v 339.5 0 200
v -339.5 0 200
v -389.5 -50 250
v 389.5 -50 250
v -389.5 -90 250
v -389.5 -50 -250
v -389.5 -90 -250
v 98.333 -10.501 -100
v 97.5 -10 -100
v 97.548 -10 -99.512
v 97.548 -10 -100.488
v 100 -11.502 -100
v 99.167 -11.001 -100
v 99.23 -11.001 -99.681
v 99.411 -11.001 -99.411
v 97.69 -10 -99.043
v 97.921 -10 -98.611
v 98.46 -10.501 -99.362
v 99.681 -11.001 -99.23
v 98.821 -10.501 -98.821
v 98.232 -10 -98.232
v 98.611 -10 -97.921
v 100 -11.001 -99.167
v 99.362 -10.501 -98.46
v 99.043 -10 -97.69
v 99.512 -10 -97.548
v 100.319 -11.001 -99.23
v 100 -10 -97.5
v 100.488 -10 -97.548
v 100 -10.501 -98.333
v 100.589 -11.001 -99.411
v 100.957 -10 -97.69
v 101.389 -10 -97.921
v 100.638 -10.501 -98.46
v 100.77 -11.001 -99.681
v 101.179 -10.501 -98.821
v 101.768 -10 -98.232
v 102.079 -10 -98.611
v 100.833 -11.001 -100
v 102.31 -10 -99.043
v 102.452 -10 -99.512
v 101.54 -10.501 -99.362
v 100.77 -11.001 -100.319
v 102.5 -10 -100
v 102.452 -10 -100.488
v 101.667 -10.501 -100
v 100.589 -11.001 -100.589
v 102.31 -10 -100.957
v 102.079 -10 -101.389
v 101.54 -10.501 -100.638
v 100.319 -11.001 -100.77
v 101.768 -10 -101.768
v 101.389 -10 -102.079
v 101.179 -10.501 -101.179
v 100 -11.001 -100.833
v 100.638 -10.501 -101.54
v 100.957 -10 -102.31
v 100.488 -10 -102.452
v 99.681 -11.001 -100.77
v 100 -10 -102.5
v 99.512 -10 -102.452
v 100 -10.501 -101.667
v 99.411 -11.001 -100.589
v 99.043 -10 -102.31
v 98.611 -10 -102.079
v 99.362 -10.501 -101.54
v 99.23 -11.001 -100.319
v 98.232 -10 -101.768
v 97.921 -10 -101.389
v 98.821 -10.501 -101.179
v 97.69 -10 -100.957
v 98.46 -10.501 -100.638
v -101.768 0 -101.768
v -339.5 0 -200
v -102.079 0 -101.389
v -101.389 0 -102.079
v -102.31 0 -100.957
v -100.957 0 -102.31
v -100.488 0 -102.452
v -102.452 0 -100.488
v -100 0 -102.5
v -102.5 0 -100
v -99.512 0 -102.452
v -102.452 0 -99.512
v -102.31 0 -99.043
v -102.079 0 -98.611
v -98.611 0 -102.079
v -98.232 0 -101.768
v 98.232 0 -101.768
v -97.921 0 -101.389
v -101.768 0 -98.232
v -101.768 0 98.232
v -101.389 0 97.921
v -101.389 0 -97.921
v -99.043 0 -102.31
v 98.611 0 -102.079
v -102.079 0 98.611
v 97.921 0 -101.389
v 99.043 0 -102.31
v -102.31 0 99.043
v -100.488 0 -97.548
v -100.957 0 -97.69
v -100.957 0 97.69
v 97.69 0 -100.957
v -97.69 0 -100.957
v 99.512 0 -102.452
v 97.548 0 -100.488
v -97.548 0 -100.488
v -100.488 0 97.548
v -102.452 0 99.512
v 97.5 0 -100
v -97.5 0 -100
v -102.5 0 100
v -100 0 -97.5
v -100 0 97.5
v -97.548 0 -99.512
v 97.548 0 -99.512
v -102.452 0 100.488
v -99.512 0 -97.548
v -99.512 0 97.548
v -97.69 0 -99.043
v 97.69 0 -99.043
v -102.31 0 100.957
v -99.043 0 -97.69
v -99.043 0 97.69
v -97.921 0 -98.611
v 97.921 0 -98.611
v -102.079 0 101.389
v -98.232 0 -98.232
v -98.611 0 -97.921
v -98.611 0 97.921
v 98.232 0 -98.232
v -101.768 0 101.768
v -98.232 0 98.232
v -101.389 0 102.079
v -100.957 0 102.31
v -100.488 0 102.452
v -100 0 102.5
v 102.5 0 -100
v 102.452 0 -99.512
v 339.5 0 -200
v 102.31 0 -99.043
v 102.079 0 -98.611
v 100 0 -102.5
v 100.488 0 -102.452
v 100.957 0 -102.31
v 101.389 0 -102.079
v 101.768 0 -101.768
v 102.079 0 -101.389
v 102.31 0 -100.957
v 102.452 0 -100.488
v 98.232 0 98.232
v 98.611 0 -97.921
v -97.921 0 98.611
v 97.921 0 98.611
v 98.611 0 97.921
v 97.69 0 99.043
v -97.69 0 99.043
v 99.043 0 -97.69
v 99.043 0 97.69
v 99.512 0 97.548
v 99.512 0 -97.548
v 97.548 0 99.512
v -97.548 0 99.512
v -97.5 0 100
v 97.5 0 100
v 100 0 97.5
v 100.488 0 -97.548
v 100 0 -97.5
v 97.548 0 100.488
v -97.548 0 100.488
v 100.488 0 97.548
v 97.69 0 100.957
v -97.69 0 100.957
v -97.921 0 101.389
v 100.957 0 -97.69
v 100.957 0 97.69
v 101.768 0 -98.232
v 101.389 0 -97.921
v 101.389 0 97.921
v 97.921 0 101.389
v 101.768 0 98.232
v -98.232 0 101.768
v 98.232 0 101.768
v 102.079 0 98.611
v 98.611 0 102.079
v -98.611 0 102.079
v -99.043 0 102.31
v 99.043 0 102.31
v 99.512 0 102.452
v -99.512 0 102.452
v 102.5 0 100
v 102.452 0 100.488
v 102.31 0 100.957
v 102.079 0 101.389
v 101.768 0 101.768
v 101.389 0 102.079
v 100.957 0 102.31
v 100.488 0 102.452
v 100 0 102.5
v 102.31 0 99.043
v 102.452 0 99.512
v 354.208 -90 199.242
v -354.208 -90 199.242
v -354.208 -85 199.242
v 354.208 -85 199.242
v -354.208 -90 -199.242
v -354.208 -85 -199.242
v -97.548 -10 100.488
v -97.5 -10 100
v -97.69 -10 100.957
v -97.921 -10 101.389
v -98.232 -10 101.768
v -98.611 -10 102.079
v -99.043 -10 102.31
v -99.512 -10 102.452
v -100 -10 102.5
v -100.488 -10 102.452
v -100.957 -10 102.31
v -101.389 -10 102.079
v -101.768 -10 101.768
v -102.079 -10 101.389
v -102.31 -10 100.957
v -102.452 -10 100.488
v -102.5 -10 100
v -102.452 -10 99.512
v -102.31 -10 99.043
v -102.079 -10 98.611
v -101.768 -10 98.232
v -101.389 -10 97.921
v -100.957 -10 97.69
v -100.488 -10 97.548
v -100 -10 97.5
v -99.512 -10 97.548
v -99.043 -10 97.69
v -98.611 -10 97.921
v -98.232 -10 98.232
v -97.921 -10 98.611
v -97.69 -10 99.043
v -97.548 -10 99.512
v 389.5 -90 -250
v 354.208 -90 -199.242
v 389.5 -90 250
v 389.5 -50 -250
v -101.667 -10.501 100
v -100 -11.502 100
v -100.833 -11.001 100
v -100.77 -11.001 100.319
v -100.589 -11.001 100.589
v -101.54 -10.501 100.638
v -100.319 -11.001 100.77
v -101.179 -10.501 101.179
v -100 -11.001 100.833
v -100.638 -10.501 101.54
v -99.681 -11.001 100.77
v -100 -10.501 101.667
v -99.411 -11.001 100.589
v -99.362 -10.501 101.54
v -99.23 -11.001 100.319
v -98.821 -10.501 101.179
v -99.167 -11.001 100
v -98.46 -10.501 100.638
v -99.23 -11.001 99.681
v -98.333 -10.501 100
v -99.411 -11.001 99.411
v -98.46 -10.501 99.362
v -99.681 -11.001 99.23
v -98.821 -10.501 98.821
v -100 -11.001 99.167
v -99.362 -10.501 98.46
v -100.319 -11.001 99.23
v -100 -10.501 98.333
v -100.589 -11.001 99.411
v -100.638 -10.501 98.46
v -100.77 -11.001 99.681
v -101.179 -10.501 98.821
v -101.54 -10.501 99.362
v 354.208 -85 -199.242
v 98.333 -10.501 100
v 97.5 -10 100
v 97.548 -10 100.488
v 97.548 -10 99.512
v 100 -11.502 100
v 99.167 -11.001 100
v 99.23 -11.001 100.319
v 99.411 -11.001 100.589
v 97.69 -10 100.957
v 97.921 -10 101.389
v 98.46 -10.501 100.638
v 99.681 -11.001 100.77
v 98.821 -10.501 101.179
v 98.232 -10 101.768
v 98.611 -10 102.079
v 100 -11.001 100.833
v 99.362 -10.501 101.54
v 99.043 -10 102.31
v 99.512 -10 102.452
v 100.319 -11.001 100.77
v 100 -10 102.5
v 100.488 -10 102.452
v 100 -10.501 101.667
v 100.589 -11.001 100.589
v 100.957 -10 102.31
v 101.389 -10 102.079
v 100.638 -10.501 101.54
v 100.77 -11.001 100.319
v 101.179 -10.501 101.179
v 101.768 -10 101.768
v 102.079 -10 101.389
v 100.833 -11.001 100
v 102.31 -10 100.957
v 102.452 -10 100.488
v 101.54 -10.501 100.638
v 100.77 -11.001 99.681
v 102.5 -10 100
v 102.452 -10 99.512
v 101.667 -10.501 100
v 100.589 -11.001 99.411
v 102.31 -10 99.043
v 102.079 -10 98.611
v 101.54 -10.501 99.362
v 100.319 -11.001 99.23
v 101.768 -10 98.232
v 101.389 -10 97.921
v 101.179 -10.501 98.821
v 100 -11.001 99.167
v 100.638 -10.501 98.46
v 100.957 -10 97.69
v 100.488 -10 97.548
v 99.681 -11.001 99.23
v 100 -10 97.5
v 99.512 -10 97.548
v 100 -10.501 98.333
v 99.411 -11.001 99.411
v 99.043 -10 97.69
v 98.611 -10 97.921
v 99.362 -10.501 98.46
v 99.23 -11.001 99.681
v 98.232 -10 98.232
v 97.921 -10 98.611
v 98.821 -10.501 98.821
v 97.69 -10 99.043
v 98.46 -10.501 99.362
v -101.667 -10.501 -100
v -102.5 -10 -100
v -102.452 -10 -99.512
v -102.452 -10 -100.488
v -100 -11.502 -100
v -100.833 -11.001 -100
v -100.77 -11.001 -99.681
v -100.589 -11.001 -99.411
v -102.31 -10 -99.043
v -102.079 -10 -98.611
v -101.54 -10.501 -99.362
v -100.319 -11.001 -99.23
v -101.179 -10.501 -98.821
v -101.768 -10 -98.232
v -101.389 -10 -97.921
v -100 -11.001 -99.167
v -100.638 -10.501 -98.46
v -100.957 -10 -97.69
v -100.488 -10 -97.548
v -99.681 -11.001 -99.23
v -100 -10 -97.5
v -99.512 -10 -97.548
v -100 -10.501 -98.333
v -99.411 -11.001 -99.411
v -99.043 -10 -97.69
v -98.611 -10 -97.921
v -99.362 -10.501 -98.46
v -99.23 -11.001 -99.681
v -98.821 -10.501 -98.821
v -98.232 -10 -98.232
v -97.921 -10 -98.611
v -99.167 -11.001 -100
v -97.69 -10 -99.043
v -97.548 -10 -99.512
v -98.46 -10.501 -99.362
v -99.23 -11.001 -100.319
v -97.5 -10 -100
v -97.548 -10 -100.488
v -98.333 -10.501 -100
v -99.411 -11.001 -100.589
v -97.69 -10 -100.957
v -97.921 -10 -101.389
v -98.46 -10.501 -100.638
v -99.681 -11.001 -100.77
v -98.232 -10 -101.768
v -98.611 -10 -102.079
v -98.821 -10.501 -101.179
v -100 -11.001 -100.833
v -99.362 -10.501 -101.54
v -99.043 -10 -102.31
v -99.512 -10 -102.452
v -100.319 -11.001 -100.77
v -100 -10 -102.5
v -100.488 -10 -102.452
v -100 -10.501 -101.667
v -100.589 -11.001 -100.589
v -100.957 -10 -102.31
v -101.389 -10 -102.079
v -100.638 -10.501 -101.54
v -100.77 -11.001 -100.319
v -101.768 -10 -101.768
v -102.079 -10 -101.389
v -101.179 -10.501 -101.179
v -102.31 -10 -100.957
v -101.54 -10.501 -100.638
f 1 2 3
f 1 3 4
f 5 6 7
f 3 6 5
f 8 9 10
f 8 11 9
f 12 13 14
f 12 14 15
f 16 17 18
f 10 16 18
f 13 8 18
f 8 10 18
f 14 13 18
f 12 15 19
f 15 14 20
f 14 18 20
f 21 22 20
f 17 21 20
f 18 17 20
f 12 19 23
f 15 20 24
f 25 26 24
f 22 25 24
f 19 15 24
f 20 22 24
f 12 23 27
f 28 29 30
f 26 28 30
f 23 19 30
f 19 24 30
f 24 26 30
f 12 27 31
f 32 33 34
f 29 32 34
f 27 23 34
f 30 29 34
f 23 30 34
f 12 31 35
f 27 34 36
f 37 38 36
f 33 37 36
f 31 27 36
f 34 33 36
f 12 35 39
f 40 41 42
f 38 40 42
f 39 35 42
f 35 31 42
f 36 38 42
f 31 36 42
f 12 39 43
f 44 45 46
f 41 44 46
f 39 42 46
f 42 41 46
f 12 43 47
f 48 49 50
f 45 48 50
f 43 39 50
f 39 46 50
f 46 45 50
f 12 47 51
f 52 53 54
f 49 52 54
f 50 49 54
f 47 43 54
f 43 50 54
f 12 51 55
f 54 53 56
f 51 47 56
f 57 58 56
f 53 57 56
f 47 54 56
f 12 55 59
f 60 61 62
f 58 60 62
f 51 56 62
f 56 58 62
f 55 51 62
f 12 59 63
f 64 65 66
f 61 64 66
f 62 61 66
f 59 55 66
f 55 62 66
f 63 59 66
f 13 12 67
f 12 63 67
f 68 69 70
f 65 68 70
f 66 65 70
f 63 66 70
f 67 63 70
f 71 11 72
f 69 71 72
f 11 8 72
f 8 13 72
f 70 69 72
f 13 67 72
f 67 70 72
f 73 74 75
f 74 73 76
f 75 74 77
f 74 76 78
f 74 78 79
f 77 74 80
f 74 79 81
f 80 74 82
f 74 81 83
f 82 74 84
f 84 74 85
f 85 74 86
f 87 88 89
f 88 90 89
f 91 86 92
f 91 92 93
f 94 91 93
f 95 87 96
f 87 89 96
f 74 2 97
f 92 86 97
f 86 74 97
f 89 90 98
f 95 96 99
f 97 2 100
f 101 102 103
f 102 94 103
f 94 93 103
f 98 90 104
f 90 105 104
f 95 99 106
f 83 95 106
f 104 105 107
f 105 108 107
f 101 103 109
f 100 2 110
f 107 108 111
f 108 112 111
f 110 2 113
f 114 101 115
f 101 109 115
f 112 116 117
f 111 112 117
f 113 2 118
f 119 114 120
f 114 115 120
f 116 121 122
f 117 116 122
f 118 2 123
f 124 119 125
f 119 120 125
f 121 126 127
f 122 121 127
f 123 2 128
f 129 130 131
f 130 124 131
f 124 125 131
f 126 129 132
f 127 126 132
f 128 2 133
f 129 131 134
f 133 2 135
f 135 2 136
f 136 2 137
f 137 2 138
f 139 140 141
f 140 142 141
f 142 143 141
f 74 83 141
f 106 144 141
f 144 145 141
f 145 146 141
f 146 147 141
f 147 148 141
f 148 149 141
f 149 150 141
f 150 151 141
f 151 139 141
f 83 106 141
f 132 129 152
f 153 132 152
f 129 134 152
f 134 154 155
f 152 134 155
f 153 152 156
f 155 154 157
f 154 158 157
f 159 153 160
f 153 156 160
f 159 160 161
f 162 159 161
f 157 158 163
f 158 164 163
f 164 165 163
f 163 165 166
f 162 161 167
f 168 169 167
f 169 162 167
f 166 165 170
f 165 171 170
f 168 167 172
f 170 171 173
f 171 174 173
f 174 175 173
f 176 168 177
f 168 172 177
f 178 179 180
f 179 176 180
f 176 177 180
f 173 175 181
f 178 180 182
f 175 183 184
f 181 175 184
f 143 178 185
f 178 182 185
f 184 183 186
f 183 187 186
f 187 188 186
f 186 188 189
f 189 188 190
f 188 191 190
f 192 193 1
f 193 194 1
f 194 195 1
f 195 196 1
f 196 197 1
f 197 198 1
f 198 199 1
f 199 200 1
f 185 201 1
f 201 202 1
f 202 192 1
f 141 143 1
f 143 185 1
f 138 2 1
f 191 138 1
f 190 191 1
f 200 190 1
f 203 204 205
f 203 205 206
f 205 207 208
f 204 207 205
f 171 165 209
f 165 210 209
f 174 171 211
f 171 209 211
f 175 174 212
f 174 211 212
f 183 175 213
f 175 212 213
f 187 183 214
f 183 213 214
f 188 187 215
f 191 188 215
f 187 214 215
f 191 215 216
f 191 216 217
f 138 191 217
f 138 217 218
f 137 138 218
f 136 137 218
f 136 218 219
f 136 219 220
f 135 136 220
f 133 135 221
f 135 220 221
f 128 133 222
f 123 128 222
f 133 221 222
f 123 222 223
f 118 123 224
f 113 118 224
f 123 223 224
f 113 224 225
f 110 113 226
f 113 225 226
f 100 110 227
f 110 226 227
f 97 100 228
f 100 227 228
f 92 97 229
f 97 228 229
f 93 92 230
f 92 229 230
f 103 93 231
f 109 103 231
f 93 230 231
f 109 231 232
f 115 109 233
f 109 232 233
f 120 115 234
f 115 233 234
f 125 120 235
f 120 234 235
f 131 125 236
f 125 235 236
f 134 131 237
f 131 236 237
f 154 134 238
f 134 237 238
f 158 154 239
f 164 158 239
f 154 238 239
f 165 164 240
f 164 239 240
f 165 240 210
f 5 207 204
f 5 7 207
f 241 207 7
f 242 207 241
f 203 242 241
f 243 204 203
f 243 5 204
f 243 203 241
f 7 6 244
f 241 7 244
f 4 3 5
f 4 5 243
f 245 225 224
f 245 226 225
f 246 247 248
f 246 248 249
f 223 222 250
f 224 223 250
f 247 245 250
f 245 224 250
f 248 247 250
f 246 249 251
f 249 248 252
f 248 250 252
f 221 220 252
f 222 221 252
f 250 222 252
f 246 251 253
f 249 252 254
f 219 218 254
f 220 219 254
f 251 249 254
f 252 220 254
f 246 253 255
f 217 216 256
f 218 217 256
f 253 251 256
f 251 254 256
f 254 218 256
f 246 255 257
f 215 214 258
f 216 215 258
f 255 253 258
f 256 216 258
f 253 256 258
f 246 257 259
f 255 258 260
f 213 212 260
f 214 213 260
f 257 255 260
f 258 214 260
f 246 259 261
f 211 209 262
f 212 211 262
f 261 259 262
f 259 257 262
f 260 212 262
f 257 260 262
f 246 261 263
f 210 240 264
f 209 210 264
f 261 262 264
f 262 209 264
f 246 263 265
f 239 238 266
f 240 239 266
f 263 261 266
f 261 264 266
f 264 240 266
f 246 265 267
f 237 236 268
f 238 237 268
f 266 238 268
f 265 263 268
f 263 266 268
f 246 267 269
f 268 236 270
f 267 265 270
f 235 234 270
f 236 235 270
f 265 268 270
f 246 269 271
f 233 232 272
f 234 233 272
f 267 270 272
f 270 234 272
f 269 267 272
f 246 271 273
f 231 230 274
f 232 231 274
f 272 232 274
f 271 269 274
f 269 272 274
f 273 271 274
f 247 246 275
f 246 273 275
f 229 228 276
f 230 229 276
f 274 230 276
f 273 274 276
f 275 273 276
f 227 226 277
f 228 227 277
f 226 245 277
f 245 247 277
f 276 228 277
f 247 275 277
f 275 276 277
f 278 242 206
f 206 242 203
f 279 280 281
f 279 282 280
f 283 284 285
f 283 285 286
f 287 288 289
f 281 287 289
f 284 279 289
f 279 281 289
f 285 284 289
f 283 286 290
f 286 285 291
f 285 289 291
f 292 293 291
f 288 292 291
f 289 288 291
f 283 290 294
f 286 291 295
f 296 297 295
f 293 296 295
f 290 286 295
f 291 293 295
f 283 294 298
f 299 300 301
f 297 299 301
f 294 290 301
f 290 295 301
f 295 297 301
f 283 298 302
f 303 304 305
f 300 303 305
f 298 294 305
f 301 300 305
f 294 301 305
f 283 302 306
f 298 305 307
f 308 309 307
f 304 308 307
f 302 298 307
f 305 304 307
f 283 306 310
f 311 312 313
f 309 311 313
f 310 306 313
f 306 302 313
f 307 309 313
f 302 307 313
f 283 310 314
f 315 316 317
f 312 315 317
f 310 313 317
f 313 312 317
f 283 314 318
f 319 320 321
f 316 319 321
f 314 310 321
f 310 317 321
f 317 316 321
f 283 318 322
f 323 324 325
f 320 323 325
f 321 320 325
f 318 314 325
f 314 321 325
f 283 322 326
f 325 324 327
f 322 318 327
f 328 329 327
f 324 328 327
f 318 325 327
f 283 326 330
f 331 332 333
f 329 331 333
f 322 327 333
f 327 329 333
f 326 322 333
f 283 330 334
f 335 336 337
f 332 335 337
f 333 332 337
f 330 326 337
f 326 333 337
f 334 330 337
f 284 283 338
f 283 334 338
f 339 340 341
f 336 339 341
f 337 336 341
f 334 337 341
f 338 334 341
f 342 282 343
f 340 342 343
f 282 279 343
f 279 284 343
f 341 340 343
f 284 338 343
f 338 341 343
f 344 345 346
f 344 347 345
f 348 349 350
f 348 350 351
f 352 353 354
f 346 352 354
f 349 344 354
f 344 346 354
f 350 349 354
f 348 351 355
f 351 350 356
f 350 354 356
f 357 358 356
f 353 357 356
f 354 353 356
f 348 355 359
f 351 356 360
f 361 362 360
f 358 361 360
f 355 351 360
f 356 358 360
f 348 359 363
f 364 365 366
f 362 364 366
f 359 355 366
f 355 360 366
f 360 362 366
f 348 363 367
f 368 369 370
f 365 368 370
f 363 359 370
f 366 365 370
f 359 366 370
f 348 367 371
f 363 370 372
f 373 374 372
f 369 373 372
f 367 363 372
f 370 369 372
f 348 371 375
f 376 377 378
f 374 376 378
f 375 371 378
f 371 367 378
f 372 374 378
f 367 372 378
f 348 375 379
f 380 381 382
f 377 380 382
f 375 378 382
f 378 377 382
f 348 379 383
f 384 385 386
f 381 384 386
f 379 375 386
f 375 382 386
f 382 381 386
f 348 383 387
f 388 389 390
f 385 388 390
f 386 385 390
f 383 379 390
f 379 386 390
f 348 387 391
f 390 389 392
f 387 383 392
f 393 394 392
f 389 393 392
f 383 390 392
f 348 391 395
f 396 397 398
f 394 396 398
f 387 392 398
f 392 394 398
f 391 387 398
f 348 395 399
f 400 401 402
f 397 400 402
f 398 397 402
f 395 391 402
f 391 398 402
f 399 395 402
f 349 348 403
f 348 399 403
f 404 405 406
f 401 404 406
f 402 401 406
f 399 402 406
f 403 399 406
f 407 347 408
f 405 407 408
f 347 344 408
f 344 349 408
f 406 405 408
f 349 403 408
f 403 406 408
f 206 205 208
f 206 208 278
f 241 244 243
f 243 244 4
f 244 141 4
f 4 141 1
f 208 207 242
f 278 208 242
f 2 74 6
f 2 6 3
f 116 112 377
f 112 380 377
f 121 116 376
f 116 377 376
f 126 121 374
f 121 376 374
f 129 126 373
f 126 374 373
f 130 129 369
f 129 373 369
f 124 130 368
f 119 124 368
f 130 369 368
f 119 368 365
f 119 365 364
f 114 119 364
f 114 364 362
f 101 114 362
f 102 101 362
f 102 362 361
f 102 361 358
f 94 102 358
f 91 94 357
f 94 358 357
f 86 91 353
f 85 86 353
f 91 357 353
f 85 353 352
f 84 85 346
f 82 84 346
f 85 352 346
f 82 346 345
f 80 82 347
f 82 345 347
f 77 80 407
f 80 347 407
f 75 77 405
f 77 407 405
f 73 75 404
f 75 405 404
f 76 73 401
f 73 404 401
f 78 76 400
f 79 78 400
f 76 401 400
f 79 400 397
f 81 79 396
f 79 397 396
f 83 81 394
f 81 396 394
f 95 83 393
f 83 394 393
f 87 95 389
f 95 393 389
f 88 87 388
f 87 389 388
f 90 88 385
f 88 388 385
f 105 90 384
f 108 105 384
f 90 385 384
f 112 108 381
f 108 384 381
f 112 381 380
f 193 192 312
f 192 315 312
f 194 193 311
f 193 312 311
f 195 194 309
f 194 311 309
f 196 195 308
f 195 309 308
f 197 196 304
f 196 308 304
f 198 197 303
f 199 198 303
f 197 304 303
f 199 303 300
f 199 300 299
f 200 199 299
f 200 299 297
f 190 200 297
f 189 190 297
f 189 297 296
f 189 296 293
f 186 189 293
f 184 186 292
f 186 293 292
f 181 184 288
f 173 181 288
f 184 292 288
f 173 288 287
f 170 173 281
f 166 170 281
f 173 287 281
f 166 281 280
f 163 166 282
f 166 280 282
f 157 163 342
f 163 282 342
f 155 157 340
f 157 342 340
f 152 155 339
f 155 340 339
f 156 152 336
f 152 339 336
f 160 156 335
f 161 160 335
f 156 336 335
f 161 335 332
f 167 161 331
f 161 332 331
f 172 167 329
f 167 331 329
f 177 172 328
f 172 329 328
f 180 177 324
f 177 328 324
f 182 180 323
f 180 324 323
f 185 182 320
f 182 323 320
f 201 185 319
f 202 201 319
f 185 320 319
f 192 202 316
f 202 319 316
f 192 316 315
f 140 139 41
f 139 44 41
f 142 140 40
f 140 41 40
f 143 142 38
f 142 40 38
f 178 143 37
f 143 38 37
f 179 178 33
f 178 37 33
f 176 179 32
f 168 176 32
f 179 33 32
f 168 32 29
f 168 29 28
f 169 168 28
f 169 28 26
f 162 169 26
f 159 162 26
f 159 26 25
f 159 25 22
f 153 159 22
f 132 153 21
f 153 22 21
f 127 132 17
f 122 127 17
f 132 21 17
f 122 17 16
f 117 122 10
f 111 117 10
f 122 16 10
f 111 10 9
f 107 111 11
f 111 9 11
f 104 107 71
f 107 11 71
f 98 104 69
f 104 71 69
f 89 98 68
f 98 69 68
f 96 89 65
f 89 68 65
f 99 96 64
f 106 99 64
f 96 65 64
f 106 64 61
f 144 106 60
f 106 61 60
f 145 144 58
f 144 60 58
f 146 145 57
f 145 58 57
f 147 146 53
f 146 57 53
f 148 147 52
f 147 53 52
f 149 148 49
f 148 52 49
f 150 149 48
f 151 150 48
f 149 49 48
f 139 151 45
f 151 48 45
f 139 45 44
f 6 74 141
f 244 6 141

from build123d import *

# Parameters (mm, degrees)
F0_W     = 779
F0_H     = 500
F1_DEPTH = 90
F2_SIZE  = 50
F3_W     = 708.4165965748
F3_H     = 398.4843355733
F4_DEPTH = 5
F6_D     = 5
F6_DEPTH = 10
F6_TIP   = 1.5021515476


with BuildPart() as f1:
    # F0 (on Front) → F1 (new body)
    with BuildSketch(Plane.XZ):
        Rectangle(F0_W, F0_H)
    extrude(amount=F1_DEPTH)

    # F2
    f2_edges = [f1.edges().sort_by_distance(p)[0] for p in [
        (389.5, 0, 0),
        (0, 0, 250),
        (-389.5, 0, 0),
        (0, 0, -250),
    ]]
    chamfer(f2_edges, length=F2_SIZE)

    # F3 (on face) → F4 (cut)
    with BuildSketch(Plane.XZ.offset(90)):
        Rectangle(F3_W, F3_H)
    extrude(amount=-F4_DEPTH, mode=Mode.SUBTRACT)

    # F6
    with Locations(Plane(origin=(0, 0, 0), x_dir=(-1, 0, 0), z_dir=(0, 1, 0))):
        with Locations((-100, 100), (100, 100), (-100, -100), (100, -100)):
            Hole(F6_D / 2, depth=F6_DEPTH)
            with Locations((0, 0, -(F6_DEPTH + F6_TIP / 2))):  # 118° drill point
                Cone(0, F6_D / 2, F6_TIP, mode=Mode.SUBTRACT)


solid = f1.part
